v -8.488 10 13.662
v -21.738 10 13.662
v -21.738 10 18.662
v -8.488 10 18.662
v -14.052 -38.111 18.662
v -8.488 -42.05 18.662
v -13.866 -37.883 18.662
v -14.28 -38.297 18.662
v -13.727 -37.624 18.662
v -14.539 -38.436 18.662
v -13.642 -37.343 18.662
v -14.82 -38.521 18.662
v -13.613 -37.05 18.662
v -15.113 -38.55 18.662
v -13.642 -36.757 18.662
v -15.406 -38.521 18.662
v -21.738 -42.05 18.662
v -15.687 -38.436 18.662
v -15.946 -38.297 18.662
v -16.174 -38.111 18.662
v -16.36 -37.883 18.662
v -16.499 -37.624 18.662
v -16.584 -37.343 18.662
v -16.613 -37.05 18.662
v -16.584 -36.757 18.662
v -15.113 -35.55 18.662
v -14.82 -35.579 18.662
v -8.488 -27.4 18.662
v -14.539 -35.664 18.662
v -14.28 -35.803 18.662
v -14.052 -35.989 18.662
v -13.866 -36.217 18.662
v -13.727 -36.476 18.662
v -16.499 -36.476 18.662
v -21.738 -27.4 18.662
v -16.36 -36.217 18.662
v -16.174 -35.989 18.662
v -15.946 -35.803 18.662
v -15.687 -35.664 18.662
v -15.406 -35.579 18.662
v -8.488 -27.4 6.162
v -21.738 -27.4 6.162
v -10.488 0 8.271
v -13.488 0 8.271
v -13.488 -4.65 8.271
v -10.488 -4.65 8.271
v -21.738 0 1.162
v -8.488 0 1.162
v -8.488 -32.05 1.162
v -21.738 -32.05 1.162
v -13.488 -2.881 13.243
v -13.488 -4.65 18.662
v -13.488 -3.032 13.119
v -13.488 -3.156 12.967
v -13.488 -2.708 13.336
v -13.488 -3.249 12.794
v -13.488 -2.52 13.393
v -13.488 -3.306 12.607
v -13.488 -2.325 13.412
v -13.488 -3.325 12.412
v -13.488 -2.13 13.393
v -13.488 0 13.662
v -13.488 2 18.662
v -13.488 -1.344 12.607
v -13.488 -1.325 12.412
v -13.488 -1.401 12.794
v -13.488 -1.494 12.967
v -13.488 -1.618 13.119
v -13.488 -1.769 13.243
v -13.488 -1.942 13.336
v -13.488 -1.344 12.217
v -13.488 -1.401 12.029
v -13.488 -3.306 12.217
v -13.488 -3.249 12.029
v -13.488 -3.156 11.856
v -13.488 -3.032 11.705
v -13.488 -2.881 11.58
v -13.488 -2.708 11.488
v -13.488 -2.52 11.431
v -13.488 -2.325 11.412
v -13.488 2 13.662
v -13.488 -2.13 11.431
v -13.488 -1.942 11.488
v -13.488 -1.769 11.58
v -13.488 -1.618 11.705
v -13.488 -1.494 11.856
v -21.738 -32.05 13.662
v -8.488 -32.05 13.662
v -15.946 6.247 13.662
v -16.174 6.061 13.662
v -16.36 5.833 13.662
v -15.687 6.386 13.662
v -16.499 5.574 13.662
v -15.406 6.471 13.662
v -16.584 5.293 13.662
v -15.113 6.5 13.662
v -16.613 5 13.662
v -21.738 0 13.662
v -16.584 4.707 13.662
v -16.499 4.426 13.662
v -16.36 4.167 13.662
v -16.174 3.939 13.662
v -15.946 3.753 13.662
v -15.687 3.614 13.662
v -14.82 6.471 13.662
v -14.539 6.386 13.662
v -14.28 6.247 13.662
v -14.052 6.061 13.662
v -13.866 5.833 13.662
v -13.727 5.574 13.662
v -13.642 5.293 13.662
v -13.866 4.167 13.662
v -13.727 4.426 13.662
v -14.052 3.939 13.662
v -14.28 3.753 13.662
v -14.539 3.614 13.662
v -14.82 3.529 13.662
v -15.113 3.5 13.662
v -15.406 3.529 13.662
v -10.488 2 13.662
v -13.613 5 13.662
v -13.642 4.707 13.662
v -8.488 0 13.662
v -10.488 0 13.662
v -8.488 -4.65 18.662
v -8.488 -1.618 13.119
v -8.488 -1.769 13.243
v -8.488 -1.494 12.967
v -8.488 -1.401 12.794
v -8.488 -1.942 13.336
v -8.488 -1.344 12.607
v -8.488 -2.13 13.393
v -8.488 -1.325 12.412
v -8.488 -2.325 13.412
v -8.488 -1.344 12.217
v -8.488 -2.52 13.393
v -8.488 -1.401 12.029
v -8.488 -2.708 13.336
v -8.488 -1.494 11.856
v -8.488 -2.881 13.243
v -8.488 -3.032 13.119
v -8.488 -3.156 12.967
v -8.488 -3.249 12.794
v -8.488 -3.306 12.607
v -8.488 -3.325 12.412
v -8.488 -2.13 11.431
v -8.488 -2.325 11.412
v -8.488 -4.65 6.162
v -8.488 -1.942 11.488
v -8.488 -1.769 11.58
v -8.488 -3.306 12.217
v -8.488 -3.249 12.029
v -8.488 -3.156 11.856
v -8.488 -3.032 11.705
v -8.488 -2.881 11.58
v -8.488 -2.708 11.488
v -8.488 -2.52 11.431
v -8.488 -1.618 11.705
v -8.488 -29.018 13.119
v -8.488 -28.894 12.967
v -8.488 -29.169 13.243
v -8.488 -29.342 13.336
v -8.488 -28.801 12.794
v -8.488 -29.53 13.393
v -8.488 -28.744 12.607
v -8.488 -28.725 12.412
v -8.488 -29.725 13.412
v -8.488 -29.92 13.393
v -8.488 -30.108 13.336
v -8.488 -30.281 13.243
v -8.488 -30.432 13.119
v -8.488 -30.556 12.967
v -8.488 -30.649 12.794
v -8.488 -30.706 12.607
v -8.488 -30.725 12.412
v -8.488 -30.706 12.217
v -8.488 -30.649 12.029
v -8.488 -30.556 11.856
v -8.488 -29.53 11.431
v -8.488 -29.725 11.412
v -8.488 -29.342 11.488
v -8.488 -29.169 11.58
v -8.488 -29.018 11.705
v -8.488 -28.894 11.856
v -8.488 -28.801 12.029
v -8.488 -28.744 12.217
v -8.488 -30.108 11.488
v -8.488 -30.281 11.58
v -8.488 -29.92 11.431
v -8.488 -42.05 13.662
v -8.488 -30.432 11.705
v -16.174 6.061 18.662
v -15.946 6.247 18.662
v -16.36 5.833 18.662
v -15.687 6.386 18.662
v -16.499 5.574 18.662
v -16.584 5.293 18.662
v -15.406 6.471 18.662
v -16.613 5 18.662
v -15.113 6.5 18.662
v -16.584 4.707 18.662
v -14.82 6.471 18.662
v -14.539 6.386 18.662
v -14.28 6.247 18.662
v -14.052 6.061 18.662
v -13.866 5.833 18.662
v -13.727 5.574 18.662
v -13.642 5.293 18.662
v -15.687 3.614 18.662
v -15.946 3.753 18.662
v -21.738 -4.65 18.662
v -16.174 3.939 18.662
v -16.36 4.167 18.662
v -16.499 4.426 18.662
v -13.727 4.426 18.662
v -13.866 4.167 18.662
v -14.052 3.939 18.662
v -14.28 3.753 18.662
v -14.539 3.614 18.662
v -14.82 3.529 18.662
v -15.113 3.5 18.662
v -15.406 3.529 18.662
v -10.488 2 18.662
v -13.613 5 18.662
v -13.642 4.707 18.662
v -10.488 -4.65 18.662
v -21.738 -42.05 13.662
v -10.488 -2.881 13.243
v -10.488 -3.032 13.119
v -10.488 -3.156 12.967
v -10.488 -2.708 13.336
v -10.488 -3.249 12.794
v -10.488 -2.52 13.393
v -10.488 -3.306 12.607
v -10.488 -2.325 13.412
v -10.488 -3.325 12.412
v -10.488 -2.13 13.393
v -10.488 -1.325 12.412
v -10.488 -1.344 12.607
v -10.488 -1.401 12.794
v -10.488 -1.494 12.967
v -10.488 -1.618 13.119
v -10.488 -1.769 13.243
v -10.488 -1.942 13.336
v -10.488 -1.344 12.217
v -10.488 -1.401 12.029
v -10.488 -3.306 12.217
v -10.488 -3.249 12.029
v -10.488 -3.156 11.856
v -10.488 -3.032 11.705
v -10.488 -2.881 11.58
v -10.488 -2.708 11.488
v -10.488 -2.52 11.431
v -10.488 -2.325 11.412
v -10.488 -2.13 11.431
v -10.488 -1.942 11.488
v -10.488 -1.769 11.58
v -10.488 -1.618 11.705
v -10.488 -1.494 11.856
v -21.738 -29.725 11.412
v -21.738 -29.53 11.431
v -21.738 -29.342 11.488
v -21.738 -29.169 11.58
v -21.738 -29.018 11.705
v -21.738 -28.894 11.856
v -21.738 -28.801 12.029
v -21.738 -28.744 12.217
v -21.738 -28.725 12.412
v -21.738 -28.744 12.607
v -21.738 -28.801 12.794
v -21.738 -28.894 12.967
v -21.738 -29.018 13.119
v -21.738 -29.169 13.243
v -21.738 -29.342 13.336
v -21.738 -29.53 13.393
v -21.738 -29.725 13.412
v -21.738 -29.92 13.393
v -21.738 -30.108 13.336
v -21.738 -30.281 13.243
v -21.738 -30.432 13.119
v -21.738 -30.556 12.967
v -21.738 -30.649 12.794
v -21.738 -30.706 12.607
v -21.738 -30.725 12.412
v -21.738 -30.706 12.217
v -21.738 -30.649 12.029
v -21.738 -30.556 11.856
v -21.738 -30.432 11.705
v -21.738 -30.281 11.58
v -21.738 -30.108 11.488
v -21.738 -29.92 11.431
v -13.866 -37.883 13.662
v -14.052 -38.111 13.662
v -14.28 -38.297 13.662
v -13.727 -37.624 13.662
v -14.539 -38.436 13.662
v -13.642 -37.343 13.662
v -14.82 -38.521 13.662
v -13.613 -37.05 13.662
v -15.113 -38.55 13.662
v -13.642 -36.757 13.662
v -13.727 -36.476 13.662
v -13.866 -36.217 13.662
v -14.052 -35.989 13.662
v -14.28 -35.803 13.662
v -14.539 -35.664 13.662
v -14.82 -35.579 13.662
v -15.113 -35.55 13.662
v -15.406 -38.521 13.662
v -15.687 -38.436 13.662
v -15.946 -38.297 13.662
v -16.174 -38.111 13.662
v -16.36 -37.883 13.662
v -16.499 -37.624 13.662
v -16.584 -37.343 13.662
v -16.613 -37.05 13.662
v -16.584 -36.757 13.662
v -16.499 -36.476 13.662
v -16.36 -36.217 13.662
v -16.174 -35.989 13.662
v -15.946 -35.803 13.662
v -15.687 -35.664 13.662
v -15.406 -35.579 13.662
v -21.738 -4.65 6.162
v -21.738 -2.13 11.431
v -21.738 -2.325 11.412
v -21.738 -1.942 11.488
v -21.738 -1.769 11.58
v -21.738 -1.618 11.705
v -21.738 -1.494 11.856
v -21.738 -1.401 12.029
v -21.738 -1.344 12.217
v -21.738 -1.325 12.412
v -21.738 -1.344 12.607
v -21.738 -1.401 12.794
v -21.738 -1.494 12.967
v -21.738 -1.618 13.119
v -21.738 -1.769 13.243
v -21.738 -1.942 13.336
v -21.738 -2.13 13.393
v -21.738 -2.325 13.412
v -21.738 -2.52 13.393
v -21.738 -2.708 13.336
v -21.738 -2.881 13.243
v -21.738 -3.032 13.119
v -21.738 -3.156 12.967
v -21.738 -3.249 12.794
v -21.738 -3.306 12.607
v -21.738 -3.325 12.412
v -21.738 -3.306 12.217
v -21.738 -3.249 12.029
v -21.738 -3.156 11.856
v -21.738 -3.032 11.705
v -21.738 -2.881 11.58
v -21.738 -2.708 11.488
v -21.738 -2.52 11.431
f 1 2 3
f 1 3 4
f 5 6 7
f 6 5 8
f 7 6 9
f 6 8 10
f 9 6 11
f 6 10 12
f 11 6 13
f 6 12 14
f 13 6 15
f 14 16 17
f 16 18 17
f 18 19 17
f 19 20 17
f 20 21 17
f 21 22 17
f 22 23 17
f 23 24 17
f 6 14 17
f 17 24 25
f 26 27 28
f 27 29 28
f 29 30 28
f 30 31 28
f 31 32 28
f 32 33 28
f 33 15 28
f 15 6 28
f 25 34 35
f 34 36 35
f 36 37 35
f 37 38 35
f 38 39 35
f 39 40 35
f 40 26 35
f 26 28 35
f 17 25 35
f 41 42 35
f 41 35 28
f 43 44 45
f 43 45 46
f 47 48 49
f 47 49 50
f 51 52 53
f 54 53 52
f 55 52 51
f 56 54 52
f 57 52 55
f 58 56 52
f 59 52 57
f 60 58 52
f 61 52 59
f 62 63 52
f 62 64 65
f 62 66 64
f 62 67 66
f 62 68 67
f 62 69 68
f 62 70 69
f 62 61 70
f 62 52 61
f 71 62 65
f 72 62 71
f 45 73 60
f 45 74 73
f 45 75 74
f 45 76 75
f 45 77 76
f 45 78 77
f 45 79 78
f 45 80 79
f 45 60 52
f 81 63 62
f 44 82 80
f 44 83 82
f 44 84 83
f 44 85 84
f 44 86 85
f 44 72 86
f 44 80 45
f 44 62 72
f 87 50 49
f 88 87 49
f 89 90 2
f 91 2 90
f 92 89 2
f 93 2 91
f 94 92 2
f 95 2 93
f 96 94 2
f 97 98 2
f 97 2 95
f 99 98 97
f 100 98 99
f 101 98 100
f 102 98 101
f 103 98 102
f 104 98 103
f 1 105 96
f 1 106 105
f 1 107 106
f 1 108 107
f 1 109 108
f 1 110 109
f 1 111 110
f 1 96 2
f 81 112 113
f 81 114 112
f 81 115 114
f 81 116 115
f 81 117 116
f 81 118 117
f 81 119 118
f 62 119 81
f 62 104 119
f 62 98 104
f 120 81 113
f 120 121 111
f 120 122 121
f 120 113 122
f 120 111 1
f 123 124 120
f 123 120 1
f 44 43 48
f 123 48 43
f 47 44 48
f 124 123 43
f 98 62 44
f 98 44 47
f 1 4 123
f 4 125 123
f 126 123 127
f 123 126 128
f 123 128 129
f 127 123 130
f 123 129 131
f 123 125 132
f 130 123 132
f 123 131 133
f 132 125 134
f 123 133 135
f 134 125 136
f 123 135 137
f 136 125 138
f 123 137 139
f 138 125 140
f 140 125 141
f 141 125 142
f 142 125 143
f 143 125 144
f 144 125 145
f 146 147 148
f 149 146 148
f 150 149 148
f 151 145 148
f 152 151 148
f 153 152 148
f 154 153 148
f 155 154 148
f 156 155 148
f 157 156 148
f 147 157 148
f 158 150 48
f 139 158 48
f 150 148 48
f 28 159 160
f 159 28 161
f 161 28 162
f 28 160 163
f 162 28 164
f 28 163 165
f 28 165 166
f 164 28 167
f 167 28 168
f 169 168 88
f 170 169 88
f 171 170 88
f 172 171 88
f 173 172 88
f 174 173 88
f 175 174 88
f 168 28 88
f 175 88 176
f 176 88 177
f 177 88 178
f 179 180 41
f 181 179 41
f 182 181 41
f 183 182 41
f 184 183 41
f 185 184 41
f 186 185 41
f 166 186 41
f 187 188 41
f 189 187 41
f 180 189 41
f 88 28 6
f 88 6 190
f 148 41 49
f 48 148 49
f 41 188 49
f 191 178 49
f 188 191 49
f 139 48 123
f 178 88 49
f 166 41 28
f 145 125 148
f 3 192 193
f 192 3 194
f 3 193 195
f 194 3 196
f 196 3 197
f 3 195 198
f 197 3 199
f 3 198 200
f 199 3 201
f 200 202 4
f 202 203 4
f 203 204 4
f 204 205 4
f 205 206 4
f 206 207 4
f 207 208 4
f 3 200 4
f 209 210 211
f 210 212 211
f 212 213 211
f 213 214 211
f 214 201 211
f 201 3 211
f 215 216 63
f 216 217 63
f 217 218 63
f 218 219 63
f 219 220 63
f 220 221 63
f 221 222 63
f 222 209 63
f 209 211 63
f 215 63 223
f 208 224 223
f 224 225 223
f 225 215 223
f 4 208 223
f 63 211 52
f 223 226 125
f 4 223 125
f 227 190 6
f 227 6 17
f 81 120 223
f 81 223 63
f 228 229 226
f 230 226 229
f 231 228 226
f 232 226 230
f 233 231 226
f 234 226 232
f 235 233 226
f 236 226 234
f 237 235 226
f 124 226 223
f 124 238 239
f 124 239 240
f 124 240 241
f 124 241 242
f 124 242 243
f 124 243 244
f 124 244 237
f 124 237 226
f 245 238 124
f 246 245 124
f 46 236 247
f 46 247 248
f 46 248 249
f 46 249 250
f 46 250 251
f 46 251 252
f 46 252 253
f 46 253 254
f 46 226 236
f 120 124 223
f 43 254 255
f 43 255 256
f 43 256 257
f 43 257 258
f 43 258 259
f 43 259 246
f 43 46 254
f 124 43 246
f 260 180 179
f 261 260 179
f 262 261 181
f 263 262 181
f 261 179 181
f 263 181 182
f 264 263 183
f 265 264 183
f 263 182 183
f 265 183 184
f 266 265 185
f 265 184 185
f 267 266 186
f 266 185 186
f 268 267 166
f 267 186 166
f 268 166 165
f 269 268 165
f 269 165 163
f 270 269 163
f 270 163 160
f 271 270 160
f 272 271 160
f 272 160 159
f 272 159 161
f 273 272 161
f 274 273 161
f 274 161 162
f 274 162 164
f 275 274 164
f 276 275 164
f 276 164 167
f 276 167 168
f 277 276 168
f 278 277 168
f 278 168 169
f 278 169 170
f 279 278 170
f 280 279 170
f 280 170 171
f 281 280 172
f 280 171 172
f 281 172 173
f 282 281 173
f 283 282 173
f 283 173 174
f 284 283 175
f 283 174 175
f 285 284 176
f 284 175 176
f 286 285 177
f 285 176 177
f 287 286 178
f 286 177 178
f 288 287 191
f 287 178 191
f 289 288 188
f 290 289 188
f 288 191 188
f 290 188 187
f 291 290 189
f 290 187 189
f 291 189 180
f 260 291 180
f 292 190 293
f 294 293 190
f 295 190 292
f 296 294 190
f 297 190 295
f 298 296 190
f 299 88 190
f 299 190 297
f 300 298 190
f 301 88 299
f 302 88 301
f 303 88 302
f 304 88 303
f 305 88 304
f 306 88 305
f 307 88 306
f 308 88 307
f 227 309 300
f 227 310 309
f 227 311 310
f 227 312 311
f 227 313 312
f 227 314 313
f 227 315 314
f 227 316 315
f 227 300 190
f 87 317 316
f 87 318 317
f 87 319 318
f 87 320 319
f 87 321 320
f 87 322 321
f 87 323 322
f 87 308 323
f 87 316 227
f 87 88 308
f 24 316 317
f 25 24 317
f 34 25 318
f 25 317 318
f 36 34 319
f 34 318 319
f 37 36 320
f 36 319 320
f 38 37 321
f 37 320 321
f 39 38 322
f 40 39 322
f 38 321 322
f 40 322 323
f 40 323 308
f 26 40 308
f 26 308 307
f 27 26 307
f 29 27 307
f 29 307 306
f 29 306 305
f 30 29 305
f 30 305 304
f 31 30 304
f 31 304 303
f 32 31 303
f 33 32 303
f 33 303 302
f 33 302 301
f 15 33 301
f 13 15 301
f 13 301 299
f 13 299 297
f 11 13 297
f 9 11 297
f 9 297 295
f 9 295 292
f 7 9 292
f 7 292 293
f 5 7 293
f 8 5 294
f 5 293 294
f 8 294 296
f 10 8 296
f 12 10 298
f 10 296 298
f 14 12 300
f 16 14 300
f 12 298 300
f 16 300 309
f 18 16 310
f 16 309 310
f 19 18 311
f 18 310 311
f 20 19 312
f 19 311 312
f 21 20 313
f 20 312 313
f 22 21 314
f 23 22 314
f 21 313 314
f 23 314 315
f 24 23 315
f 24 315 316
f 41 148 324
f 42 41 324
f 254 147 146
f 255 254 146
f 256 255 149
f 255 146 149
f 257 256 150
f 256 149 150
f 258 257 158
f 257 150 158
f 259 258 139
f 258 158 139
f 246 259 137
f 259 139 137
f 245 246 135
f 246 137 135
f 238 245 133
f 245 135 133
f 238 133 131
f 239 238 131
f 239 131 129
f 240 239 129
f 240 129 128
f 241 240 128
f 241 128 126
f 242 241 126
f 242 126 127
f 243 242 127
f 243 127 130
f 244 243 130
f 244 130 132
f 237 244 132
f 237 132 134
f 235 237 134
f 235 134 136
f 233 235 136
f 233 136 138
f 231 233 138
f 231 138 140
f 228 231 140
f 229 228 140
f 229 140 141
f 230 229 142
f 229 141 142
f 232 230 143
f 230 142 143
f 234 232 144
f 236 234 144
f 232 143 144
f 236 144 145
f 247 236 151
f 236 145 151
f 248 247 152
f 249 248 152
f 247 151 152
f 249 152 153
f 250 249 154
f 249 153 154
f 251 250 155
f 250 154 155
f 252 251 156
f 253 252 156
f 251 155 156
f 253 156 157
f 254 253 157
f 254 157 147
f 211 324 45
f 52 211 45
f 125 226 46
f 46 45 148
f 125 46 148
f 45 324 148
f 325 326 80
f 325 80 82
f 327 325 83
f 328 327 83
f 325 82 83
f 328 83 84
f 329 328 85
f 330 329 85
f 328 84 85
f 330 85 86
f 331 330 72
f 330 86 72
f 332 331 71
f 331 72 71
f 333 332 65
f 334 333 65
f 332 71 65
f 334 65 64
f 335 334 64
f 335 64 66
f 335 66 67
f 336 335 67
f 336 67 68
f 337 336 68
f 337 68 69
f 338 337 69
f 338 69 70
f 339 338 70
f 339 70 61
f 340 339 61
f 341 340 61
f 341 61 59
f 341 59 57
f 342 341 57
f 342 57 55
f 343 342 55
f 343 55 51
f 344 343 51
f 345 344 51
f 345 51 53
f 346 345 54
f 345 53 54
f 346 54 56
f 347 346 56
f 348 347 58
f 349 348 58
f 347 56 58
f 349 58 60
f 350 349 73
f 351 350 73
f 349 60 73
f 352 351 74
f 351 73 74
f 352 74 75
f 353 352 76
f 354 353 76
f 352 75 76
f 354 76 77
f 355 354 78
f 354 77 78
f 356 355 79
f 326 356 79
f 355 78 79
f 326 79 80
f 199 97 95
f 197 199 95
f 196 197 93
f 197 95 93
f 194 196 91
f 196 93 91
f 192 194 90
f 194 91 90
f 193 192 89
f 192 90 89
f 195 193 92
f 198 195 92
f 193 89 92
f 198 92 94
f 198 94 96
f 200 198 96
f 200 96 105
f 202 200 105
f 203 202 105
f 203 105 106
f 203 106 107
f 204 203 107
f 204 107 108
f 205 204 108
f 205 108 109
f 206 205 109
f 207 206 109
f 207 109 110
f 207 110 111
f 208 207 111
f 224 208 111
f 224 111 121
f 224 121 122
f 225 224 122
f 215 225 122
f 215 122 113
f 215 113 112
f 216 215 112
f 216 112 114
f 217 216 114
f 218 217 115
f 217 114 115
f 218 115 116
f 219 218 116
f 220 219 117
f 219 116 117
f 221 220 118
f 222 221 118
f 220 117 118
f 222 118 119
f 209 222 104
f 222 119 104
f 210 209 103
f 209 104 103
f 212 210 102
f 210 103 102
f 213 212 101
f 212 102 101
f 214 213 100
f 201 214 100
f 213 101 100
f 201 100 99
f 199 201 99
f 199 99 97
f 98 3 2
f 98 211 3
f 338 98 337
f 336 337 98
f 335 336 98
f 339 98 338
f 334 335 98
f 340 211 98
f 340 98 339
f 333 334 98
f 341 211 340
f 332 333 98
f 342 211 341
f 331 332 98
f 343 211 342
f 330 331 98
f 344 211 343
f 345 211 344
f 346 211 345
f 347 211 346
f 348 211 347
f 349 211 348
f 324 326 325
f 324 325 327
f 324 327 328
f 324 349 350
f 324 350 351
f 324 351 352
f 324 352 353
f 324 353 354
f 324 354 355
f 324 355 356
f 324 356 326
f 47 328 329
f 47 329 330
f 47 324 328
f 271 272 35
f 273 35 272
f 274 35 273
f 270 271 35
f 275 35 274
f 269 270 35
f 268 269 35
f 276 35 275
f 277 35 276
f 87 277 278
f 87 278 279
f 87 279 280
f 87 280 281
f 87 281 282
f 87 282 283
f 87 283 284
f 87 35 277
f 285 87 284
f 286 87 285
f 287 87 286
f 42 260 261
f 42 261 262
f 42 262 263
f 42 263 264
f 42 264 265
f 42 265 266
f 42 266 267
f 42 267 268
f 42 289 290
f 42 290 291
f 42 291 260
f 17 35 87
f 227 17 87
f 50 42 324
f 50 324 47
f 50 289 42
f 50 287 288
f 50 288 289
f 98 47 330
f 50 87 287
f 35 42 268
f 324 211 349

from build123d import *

# Parameters (mm, degrees)
ESBO_O1_W                = 13.25
ESBO_O1_H                = 12.5
RESSALTO_EXTRUS_O1_DEPTH = 4.65
ESBO_O2_W                = 13.25
ESBO_O2_H                = 32.05
RESSALTO_EXTRUS_O2_DEPTH = 5
ESBO_O3_W                = 13.25
ESBO_O3_H                = 4.65
RESSALTO_EXTRUS_O3_DEPTH = 12.5
ESBO_O4_W                = 13.25
ESBO_O4_H                = 5
RESSALTO_EXTRUS_O4_DEPTH = 10
ESBO_O5_W                = 13.25
ESBO_O5_H                = 5
RESSALTO_EXTRUS_O5_DEPTH = 10
ESBO_O6_R                = 1.5
CORTE_EXTRUS_O1_DEPTH    = 10
ESBO_O7_R                = 1
CORTE_EXTRUS_O2_DEPTH    = 14.25
ESBO_O8_R                = 1
CORTE_EXTRUS_O3_DEPTH    = 14.25
ESBO_O9_W                = 3
ESBO_O9_H                = 10.390977072
CORTE_EXTRUS_O4_DEPTH    = 10
ESBO_O10_W               = 3
ESBO_O10_H               = 2
CORTE_EXTRUS_O5_DEPTH    = 10


with BuildPart() as part:
    # Esboço1 → Ressalto-extrusão1 (new body)
    with BuildSketch(Plane(origin=(0, 0, 0), x_dir=(1, 0, 0), z_dir=(0, 1, 0))):
        with Locations((-15.112918198, -12.411797698)):
            Rectangle(ESBO_O1_W, ESBO_O1_H)
    extrude(amount=-RESSALTO_EXTRUS_O1_DEPTH)

    # Esboço2 → Ressalto-extrusão2 (add)
    with BuildSketch(Plane(origin=(0, 0, 6.161797698), x_dir=(-1, 0, 0), z_dir=(0, 0, -1))):
        with Locations((15.112918198, -16.025)):
            Rectangle(ESBO_O2_W, ESBO_O2_H)
    extrude(amount=RESSALTO_EXTRUS_O2_DEPTH)

    # Esboço3 → Ressalto-extrusão3 (add)
    with BuildSketch(Plane.XY.offset(6.161797698)):
        with Locations((-15.112918198, -29.725)):
            Rectangle(ESBO_O3_W, ESBO_O3_H)
    extrude(amount=RESSALTO_EXTRUS_O3_DEPTH)

    # Esboço4 → Ressalto-extrusão4 (add)
    with BuildSketch(Plane(origin=(0, -32.05, 0), x_dir=(-1, 0, 0), z_dir=(0, -1, 0))):
        with Locations((15.112918198, -16.161797698)):
            Rectangle(ESBO_O4_W, ESBO_O4_H)
    extrude(amount=RESSALTO_EXTRUS_O4_DEPTH)

    # Esboço5 → Ressalto-extrusão5 (add)
    with BuildSketch(Plane(origin=(0, 0, 0), x_dir=(1, 0, 0), z_dir=(0, 1, 0))):
        with Locations((-15.112918198, -16.161797698)):
            Rectangle(ESBO_O5_W, ESBO_O5_H)
    extrude(amount=RESSALTO_EXTRUS_O5_DEPTH)

    # Esboço6 → Corte-extrusão1 (cut)
    with BuildSketch(Plane(origin=(0, 0, 13.661797698), x_dir=(-1, 0, 0), z_dir=(0, 0, -1))):
        with Locations((15.112918198, 5)):
            Circle(ESBO_O6_R)
        with Locations((15.112918198, -37.05)):
            Circle(ESBO_O6_R)
    extrude(amount=-CORTE_EXTRUS_O1_DEPTH, mode=Mode.SUBTRACT)

    # Esboço7 → Corte-extrusão2 (cut, through all)
    with BuildSketch(Plane(origin=(-8.487918198, 0, 0), x_dir=(0, 0, -1), z_dir=(1, 0, 0))):
        with Locations((-12.411797698, -2.325)):
            Circle(ESBO_O7_R)
    extrude(amount=-CORTE_EXTRUS_O2_DEPTH, mode=Mode.SUBTRACT)

    # Esboço8 → Corte-extrusão3 (cut, through all)
    with BuildSketch(Plane(origin=(-8.487918198, 0, 0), x_dir=(0, 0, -1), z_dir=(1, 0, 0))):
        with Locations((-12.411797698, -29.725)):
            Circle(ESBO_O8_R)
    extrude(amount=-CORTE_EXTRUS_O3_DEPTH, mode=Mode.SUBTRACT)

    # Esboço9 → Corte-extrusão4 (cut)
    with BuildSketch(Plane(origin=(0, 0, 0), x_dir=(1, 0, 0), z_dir=(0, 1, 0))):
        with Locations((-11.987918198, -13.466309162)):
            Rectangle(ESBO_O9_W, ESBO_O9_H)
    extrude(amount=-CORTE_EXTRUS_O4_DEPTH, mode=Mode.SUBTRACT)

    # Esboço10 → Corte-extrusão5 (cut)
    with BuildSketch(Plane(origin=(0, 0, 13.661797698), x_dir=(-1, 0, 0), z_dir=(0, 0, -1))):
        with Locations((11.987918198, 1)):
            Rectangle(ESBO_O10_W, ESBO_O10_H)
    extrude(amount=-CORTE_EXTRUS_O5_DEPTH, mode=Mode.SUBTRACT)


solid = part.part
